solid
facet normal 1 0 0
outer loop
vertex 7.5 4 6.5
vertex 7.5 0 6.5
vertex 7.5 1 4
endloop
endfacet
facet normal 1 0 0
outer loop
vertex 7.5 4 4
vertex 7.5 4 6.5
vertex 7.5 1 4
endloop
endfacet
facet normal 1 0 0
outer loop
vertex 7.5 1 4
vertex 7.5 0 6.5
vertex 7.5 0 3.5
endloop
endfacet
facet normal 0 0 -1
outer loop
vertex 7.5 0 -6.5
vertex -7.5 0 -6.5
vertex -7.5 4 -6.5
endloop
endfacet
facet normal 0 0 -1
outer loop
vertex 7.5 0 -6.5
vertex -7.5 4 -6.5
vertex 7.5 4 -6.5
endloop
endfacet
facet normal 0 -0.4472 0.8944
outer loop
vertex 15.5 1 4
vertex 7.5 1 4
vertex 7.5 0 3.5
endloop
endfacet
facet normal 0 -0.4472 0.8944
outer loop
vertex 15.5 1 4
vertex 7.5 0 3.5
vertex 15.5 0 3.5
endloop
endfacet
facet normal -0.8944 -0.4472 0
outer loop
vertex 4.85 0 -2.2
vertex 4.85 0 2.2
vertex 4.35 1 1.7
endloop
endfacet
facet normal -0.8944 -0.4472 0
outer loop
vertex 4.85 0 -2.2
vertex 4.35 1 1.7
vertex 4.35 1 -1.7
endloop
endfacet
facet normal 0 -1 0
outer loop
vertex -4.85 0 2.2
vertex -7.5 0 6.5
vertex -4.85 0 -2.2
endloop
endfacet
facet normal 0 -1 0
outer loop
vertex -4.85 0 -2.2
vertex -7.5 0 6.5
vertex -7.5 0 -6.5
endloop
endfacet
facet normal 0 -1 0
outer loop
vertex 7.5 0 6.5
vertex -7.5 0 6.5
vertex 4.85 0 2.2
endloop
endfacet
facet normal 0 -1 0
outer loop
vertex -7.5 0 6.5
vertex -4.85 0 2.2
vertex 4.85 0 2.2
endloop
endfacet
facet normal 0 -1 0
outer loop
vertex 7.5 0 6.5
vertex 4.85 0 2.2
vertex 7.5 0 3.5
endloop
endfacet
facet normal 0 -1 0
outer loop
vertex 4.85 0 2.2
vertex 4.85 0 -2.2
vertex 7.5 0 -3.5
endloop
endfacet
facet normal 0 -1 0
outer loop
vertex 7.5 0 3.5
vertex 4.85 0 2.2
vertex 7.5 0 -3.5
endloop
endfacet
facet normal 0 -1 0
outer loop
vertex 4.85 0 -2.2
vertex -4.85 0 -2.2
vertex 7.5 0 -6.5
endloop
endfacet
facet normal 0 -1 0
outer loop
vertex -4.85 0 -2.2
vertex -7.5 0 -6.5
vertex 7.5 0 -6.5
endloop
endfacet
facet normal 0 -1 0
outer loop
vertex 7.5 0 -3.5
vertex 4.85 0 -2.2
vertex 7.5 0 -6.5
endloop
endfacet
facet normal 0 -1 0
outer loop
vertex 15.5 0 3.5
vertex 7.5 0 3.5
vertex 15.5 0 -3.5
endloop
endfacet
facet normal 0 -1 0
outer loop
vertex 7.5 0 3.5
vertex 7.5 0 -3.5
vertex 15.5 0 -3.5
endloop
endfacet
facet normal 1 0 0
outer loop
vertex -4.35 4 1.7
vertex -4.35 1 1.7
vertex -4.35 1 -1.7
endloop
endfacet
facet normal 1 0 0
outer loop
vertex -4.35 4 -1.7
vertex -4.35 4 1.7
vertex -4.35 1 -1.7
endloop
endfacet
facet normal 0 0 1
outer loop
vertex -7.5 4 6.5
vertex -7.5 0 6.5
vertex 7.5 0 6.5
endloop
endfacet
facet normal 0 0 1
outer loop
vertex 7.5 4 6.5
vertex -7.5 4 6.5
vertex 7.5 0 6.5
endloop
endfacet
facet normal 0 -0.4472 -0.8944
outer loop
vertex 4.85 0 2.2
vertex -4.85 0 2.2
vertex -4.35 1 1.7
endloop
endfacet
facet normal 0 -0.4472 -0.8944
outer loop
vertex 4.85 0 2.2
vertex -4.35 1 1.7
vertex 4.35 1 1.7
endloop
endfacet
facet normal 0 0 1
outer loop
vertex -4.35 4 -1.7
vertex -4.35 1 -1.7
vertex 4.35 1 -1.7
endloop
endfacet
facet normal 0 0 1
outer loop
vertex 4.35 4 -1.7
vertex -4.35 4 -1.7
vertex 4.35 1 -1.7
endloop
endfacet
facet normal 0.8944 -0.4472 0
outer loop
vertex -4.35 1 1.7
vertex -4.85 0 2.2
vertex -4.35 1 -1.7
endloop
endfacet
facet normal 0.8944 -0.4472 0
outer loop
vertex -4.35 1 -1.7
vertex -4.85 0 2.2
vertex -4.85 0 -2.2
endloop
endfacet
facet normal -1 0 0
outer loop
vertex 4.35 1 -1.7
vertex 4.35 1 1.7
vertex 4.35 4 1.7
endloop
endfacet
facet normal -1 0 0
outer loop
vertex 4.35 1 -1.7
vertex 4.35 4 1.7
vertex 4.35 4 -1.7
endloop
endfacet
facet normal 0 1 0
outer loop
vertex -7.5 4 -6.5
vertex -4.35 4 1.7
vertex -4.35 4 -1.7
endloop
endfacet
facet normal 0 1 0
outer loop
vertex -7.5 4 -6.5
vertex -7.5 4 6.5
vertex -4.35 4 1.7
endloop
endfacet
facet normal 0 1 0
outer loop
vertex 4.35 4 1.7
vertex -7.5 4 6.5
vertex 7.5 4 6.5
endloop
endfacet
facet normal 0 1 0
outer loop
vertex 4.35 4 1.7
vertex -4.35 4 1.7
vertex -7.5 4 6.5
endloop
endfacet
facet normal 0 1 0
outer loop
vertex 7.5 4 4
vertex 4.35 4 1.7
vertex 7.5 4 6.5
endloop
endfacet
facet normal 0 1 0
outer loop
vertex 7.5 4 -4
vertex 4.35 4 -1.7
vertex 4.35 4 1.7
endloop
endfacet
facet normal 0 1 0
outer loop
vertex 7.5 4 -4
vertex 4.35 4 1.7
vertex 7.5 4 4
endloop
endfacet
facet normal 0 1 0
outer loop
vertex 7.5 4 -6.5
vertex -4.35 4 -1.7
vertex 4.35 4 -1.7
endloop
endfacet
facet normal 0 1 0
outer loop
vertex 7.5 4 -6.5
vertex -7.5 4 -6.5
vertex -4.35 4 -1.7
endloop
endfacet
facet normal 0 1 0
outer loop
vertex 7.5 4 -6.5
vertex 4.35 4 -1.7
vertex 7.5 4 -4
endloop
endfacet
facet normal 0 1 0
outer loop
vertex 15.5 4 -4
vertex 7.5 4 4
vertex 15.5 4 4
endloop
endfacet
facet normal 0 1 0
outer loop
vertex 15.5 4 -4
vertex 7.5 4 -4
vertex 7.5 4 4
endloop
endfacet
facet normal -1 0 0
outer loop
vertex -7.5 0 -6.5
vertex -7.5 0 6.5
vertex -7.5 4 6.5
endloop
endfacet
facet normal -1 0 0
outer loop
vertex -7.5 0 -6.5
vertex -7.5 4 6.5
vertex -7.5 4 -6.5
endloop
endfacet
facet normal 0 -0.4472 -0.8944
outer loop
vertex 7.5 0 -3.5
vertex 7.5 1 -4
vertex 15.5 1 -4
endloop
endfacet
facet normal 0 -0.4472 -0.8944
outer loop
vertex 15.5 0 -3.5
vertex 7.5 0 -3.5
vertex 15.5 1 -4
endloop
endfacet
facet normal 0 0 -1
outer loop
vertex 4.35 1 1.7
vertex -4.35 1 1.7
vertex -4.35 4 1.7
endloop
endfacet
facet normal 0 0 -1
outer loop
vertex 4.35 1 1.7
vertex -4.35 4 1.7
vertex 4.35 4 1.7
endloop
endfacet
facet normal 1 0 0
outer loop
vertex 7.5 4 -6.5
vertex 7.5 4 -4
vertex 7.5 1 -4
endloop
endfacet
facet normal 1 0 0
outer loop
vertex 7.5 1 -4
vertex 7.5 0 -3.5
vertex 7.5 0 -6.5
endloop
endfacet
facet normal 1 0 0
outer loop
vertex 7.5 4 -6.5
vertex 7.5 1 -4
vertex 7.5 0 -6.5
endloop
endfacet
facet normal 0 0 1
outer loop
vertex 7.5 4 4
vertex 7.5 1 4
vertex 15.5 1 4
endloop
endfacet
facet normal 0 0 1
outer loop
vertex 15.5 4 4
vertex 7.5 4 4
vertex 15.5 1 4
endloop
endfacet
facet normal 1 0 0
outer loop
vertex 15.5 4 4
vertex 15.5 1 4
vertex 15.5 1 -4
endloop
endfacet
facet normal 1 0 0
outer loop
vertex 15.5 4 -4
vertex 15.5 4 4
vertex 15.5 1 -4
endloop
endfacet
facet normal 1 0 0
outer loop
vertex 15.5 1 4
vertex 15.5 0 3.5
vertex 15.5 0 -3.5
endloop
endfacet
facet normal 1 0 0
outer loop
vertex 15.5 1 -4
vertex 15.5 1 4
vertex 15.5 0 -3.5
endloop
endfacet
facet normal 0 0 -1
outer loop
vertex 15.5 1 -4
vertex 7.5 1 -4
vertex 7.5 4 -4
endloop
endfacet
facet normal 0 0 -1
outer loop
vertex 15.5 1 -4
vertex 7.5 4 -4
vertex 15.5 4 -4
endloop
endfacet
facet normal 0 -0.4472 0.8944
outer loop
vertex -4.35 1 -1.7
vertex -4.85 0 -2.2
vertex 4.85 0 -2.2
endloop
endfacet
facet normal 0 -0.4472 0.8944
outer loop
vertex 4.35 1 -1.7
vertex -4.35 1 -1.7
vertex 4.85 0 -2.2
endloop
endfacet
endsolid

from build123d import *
from OCP.BRepFilletAPI import BRepFilletAPI_MakeChamfer

# Parameters (mm, degrees)
SKETCH1_W           = 15
SKETCH1_H           = 13
SKETCH1_W_2         = 8.7
SKETCH1_H_2         = 3.4
BOSS_EXTRUDE1_DEPTH = 4
SKETCH2_W           = 8
SKETCH2_H           = 8
BOSS_EXTRUDE3_DEPTH = 4
CHAMFER1_SIZE       = 1
CHAMFER1_SIZE2      = 0.5
CHAMFER2_SIZE       = 0.5
CHAMFER2_SIZE2      = 1


with BuildPart() as part:
    # Sketch1 → Boss-Extrude1 (new body)
    with BuildSketch(Plane(origin=(0, 0, 0), x_dir=(1, 0, 0), z_dir=(0, 1, 0))):
        Rectangle(SKETCH1_W, SKETCH1_H)
        Rectangle(SKETCH1_W_2, SKETCH1_H_2, mode=Mode.SUBTRACT)
    extrude(amount=BOSS_EXTRUDE1_DEPTH)

    # Sketch2 → Boss-Extrude3 (add)
    with BuildSketch(Plane(origin=(0, 0, 0), x_dir=(1, 0, 0), z_dir=(0, 1, 0))):
        with Locations((11.5, 0)):
            Rectangle(SKETCH2_W, SKETCH2_H)
    extrude(amount=BOSS_EXTRUDE3_DEPTH)

    # Chamfer1: one chamfer whose edges measure the first distance from different faces: ONE call of the kernel's chamfer builder (chamfer() names one face for all edges)
    chamfer1_edges_1 = [part.edges().sort_by_distance(p)[0] for p in [
        (4.35, 0, 0),
    ]]
    chamfer1_side_1 = [part.faces().sort_by_distance(p)[0] for p in [
        (4.35, 2, 0),
    ]]
    chamfer1_edges_2 = [part.edges().sort_by_distance(p)[0] for p in [
        (0, 0, -1.7),
    ]]
    chamfer1_side_2 = [part.faces().sort_by_distance(p)[0] for p in [
        (0, 2, -1.7),
    ]]
    chamfer1_edges_3 = [part.edges().sort_by_distance(p)[0] for p in [
        (-4.35, 0, 0),
    ]]
    chamfer1_side_3 = [part.faces().sort_by_distance(p)[0] for p in [
        (-4.35, 2, 0),
    ]]
    chamfer1_edges_4 = [part.edges().sort_by_distance(p)[0] for p in [
        (0, 0, 1.7),
    ]]
    chamfer1_side_4 = [part.faces().sort_by_distance(p)[0] for p in [
        (0, 2, 1.7),
    ]]
    chamfer1 = BRepFilletAPI_MakeChamfer(part.part.solid().wrapped)
    for e in chamfer1_edges_1:
        chamfer1.Add(CHAMFER1_SIZE, CHAMFER1_SIZE2, e.wrapped, chamfer1_side_1[0].wrapped)  # the first distance lies on this face
    for e in chamfer1_edges_2:
        chamfer1.Add(CHAMFER1_SIZE, CHAMFER1_SIZE2, e.wrapped, chamfer1_side_2[0].wrapped)  # the first distance lies on this face
    for e in chamfer1_edges_3:
        chamfer1.Add(CHAMFER1_SIZE, CHAMFER1_SIZE2, e.wrapped, chamfer1_side_3[0].wrapped)  # the first distance lies on this face
    for e in chamfer1_edges_4:
        chamfer1.Add(CHAMFER1_SIZE, CHAMFER1_SIZE2, e.wrapped, chamfer1_side_4[0].wrapped)  # the first distance lies on this face
    add(Compound.cast(chamfer1.Shape()), mode=Mode.REPLACE)

    # Chamfer2
    chamfer2_edges = [part.edges().sort_by_distance(p)[0] for p in [
        (11.5, 0, 4),
        (11.5, 0, -4),
    ]]
    chamfer2_side = [part.faces().sort_by_distance(p)[0] for p in [
        (5.114196896, 0, 0),
    ]]
    chamfer(chamfer2_edges, length=CHAMFER2_SIZE, length2=CHAMFER2_SIZE2, reference=chamfer2_side[0])


solid = part.part
